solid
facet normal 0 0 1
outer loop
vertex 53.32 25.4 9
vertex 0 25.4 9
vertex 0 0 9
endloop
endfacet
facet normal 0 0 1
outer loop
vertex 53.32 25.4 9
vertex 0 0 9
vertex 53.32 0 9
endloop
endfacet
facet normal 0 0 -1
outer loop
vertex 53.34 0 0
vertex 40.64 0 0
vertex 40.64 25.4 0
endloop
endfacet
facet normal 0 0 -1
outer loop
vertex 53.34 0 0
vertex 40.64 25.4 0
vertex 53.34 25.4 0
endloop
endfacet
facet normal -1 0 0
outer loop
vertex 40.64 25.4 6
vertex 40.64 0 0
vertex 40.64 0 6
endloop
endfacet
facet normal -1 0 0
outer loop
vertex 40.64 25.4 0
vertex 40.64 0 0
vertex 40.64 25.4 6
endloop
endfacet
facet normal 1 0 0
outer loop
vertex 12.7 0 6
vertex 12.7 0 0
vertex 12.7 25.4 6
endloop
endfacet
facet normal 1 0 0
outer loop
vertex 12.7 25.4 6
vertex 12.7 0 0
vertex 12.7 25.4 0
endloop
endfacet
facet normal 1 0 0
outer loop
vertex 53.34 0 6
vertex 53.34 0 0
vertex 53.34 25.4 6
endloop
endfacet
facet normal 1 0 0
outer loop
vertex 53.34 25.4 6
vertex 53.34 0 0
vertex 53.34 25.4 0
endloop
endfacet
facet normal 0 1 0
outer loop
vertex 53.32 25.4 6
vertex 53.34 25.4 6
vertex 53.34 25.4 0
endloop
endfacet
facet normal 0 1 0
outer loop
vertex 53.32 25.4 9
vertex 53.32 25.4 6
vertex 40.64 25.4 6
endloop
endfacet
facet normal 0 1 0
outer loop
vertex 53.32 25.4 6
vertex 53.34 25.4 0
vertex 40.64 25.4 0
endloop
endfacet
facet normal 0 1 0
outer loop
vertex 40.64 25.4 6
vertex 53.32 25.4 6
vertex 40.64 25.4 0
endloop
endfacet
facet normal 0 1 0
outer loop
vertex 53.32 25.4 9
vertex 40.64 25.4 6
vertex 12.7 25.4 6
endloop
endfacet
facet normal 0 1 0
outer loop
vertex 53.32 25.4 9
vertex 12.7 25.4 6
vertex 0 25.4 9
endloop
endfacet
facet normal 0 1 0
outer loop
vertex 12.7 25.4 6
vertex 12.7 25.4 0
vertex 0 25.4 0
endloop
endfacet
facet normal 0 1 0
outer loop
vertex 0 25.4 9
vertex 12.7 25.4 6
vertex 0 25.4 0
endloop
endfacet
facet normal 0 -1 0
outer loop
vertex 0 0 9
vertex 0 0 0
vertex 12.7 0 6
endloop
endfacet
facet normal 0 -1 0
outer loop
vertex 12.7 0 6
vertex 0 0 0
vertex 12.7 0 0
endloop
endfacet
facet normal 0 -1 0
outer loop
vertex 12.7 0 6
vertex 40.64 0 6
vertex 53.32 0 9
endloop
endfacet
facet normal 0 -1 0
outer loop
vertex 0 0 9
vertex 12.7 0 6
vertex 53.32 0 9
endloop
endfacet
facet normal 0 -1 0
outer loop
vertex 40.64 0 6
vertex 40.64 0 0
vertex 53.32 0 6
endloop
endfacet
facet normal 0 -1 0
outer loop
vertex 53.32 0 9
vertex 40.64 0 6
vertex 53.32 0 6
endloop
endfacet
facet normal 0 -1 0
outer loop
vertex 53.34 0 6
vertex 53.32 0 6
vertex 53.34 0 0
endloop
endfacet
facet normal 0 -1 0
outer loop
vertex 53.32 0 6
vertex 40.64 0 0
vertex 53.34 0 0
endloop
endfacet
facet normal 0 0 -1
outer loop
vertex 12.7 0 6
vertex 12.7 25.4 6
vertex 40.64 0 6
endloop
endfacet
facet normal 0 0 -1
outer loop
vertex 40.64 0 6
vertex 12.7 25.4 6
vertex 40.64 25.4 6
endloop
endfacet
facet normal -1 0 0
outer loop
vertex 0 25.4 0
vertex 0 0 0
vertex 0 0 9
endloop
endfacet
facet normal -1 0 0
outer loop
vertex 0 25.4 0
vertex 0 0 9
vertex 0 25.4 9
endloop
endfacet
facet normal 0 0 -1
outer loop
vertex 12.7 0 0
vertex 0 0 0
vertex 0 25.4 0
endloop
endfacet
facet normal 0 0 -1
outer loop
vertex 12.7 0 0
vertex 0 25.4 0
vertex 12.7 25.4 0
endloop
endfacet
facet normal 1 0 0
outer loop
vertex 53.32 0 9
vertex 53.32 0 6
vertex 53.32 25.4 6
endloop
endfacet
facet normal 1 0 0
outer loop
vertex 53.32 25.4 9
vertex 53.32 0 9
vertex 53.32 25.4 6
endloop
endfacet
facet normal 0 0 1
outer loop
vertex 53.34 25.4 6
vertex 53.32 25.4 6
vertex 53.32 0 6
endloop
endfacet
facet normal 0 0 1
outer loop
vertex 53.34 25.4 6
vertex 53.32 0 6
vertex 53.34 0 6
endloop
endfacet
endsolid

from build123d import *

# Parameters (mm, degrees)
F0_W     = 12.7
F0_H     = 25.4
F1_DEPTH = 6
F2_W     = 40.6199608326
F2_H     = 25.4
F2_W_2   = 12.7
F3_DEPTH = 3


with BuildPart() as f1:
    # F0 (on Top) → F1 (new body)
    with BuildSketch(Plane.XY):
        with Locations((6.35, 12.7)):
            Rectangle(F0_W, F0_H)
    extrude(amount=F1_DEPTH)



with BuildPart() as f1b:
    # F0 (on Top) → F1, piece 2 (new body)
    with BuildSketch(Plane.XY):
        with Locations((46.99, 12.7)):
            Rectangle(F0_W, F0_H)
    extrude(amount=F1_DEPTH)


with BuildPart() as f1_1:
    add(f1.part)

    add(f1b.part)  # F3 merges F1b
    # F2 (on face) → F3 (join)
    with BuildSketch(Plane.XY.offset(6)):
        with Locations((33.0099804163, 12.7)):
            Rectangle(F2_W, F2_H)
        with Locations((6.35, 12.7)):
            Rectangle(F2_W_2, F2_H)
    extrude(amount=F3_DEPTH)


solid = f1_1.part
